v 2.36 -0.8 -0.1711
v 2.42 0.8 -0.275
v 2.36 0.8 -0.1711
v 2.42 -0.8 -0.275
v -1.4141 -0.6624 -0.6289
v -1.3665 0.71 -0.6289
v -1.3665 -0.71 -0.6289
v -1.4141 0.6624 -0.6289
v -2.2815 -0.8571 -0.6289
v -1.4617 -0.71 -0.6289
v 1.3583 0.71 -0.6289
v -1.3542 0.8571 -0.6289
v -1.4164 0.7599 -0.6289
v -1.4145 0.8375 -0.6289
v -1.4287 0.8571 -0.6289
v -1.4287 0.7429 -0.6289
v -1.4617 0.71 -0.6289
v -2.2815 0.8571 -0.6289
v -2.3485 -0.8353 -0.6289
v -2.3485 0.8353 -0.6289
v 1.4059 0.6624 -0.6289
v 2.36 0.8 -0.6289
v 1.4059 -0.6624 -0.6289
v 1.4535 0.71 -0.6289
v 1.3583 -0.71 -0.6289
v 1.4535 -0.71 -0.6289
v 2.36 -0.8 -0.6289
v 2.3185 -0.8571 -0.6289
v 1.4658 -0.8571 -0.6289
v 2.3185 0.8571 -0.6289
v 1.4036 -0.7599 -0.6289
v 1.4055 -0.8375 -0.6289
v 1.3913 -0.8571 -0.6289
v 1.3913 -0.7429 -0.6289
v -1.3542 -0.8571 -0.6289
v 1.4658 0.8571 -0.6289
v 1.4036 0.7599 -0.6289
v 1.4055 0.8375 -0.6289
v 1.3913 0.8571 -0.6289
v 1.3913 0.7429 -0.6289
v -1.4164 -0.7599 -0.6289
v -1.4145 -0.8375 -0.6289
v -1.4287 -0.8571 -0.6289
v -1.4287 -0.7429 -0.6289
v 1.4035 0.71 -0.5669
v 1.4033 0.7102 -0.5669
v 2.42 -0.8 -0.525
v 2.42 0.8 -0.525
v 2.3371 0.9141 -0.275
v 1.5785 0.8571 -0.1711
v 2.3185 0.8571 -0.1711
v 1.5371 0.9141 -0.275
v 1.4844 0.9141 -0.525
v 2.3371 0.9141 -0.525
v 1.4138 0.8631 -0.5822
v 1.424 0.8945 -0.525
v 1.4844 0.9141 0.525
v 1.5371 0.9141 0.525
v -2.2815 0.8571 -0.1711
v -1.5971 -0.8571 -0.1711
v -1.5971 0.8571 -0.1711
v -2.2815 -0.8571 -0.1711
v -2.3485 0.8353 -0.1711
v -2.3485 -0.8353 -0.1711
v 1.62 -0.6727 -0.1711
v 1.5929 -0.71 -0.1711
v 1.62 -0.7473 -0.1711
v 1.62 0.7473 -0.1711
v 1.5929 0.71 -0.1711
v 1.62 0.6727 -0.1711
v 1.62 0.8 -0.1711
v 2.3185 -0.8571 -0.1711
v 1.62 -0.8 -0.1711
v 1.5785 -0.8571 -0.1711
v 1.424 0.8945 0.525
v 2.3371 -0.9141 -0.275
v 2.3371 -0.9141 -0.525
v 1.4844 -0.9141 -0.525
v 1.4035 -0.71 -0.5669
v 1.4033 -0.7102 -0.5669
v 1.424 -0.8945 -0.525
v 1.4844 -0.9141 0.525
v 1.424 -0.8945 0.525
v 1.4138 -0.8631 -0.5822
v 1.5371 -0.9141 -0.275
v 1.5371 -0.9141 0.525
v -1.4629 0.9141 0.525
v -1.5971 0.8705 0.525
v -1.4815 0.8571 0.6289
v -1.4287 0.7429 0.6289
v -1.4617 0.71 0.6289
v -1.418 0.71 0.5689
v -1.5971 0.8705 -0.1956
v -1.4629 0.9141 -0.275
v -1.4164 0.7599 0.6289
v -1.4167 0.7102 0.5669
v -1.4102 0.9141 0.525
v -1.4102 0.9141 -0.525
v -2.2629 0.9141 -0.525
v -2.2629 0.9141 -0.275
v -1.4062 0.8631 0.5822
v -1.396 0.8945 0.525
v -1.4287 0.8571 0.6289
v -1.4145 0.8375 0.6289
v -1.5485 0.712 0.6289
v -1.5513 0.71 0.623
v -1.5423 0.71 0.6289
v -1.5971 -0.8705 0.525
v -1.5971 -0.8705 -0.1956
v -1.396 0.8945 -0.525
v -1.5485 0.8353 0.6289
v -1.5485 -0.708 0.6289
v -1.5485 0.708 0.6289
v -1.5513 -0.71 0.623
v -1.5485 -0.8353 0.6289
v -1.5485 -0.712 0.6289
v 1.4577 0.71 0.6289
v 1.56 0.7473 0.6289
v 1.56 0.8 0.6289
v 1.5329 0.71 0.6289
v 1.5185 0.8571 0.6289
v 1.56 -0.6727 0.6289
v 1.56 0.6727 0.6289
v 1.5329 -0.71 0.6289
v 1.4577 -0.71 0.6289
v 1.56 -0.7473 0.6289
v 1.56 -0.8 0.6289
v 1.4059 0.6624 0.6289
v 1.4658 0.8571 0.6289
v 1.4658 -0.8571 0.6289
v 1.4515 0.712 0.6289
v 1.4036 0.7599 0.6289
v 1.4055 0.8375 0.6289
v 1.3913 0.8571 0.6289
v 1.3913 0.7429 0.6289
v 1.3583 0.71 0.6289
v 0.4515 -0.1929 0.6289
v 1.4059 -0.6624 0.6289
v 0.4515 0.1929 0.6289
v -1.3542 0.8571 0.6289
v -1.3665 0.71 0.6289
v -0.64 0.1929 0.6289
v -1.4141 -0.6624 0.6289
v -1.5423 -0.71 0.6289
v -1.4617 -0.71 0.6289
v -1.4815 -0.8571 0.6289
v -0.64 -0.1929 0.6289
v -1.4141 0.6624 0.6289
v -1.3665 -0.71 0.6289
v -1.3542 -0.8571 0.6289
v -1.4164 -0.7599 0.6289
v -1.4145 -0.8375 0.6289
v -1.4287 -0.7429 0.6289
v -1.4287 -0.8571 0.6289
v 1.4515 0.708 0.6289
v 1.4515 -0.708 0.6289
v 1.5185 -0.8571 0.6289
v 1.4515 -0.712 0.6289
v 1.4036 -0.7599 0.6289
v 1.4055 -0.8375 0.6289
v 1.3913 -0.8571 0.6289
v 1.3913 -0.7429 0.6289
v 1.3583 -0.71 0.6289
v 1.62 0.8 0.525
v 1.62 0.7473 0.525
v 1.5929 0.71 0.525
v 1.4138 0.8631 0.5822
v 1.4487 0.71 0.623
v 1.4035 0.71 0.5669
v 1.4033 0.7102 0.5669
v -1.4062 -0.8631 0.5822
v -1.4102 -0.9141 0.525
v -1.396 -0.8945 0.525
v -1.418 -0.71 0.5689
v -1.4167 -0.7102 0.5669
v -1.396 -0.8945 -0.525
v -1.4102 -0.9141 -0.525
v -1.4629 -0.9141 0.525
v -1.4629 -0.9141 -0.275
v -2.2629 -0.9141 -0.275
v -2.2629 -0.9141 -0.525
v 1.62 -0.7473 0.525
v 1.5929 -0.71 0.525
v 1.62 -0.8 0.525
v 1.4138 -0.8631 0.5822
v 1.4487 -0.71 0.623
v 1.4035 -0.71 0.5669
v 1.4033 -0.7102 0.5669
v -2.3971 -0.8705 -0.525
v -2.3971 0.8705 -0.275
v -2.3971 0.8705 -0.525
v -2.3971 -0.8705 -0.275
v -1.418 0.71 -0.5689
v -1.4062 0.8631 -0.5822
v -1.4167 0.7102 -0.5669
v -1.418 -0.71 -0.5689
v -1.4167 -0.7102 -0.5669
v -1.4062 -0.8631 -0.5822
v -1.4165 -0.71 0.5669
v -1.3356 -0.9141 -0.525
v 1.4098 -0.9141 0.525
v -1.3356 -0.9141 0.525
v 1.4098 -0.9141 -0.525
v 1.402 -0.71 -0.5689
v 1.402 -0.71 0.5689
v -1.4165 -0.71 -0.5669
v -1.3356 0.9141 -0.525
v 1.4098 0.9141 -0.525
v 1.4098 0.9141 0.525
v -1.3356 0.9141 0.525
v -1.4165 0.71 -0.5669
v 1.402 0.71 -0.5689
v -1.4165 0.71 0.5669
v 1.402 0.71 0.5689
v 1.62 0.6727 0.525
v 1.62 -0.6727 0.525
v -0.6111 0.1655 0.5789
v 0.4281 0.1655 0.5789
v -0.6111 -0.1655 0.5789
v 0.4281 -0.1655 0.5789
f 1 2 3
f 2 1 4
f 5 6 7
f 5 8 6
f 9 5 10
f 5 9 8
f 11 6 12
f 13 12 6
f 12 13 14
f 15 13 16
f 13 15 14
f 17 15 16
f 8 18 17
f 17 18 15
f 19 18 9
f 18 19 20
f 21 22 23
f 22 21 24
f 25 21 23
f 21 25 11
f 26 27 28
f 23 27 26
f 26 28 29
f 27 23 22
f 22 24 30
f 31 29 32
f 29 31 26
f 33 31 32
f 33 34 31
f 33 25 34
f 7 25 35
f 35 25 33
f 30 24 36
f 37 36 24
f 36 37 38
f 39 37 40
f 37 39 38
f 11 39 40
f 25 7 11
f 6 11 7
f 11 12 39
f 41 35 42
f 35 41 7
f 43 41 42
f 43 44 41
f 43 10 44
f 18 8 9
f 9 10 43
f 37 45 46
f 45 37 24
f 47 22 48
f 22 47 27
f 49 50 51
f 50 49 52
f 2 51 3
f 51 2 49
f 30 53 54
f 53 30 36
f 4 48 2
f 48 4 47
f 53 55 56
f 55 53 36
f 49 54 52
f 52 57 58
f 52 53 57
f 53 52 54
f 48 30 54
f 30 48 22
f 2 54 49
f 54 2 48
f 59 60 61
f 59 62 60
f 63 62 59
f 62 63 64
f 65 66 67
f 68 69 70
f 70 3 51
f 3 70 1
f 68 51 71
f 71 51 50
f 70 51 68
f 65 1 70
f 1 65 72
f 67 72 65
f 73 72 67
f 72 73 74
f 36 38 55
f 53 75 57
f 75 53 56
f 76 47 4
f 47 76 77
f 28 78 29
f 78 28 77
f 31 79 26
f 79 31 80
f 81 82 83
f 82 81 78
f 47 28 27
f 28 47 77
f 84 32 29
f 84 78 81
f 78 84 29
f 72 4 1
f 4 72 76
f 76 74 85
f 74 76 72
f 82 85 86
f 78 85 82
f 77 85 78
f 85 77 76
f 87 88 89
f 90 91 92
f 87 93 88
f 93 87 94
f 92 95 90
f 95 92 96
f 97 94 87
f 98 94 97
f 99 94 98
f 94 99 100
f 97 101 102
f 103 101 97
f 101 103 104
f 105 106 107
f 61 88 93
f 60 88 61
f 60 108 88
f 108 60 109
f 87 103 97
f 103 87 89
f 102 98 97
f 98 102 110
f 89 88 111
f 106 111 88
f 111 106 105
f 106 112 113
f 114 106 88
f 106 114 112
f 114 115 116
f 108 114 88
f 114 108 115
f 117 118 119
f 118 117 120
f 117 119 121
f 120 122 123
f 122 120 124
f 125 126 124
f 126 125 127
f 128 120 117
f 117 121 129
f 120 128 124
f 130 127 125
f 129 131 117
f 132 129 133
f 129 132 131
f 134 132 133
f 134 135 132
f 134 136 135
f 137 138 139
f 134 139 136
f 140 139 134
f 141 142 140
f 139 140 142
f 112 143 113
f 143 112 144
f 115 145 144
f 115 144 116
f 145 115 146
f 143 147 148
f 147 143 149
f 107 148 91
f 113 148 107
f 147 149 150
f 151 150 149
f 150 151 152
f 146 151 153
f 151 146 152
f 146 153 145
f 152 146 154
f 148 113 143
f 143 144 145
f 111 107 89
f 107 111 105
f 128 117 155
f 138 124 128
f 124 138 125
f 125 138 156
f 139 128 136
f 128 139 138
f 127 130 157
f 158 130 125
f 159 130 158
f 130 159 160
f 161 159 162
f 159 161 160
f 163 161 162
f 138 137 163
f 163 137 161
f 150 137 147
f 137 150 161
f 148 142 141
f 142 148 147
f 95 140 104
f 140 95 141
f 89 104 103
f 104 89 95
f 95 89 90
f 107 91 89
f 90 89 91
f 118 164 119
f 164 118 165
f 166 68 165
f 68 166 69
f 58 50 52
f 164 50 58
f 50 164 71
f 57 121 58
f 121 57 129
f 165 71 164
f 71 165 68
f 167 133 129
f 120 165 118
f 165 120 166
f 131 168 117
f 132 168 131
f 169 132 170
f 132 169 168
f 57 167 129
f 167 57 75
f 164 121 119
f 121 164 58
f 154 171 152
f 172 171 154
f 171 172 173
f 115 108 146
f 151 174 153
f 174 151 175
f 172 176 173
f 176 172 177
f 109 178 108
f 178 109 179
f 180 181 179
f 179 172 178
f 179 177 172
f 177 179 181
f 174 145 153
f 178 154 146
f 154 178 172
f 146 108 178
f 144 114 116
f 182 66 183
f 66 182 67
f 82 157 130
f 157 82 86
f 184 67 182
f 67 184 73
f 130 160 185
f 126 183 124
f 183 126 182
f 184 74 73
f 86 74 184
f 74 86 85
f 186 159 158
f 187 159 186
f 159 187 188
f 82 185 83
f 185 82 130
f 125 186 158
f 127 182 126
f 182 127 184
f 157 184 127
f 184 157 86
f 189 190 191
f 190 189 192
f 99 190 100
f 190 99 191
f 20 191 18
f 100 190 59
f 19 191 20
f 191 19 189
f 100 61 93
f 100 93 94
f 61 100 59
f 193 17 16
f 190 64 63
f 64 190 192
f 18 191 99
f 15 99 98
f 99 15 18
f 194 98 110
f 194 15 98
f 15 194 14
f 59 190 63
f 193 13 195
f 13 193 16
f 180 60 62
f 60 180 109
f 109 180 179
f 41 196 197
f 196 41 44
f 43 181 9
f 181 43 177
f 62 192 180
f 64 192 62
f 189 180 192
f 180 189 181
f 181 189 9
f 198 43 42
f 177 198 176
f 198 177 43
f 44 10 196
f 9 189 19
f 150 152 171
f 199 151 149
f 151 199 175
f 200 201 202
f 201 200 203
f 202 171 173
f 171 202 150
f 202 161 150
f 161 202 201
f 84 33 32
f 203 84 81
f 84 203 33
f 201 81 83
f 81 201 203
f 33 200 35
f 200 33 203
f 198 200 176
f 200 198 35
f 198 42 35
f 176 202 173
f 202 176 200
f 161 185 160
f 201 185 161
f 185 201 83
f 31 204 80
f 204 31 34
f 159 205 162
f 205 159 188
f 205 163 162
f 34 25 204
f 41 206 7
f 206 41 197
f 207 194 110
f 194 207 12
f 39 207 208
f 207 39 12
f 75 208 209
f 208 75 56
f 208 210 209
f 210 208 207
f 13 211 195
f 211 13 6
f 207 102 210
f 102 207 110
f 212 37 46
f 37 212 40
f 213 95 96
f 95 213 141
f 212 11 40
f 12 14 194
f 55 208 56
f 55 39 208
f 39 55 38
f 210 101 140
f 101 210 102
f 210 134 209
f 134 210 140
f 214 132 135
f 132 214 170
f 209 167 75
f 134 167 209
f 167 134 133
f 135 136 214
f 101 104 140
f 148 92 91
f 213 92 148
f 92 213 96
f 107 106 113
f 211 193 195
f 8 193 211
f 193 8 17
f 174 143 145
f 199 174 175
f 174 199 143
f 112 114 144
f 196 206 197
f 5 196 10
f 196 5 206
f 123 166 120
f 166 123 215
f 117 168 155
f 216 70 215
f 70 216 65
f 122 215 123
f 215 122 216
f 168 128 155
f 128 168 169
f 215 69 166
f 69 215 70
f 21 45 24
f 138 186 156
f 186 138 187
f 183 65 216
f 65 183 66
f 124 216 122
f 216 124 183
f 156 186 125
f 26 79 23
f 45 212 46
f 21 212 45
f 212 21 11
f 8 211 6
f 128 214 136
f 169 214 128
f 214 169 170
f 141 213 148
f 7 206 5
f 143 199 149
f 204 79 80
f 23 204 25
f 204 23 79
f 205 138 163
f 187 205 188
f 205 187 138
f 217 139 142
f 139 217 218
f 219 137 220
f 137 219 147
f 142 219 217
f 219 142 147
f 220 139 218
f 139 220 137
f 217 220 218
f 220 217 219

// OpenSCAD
// Parameters
body_L = 3.0; //[1.5:6.0:0.05]
body_W = 1.6; //[0.8:3.2:0.05]
body_H = 1.05; //[0.5:2.1:0.05]
term_L = 0.35; //[0.15:0.8:0.01]
term_H = 0.25; //[0.1:0.6:0.01]
term_inset = 0.05; //[0.0:0.2:0.01]
overlap = 0.8; //[0.3:1.5:0.05]
edge_fillet_r = 0.12; //[0.05:0.3:0.01]
chamfer = 0.18; //[0.05:0.4:0.01]
mark_L = 1.2; //[0.5:2.4:0.05]
mark_W = 0.5; //[0.2:1.2:0.05]
mark_depth = 0.05; //[0.01:0.15:0.01]

// Base shapes
module chip_body() {
  cube([body_L, body_W, body_H], center=true);
}

module terminal_end_1() {
  translate([-body_L/2 + (term_L + term_inset + overlap)/2 - overlap, 0, -body_H/2 + term_H/2])
    cube([term_L + term_inset + overlap, body_W, term_H], center=true);
}

module terminal_end_2() {
  translate([body_L/2 - (term_L + term_inset + overlap)/2 + overlap, 0, -body_H/2 + term_H/2])
    cube([term_L + term_inset + overlap, body_W, term_H], center=true);
}

module top_marking() {
  translate([-body_L/2 + mark_L/2 + overlap, 0, body_H/2 - mark_depth/2])
    cube([mark_L, mark_W, mark_depth], center=true);
}

module edge_fillet_sphere() {
  sphere(r=edge_fillet_r, center=true);
}

module chamfer_wedge() {
  rotate([0, 0, 45])
    cube([chamfer, chamfer, body_H + 2*overlap], center=true);
}

// Operations
module chip_body_with_terminals() {
  union() {
    chip_body();
    terminal_end_1();
    terminal_end_2();
  }
}

module chamfered_corners() {
  union() {
    translate([body_L/2 - chamfer/2, body_W/2 - chamfer/2, 0]) chamfer_wedge();
    translate([body_L/2 - chamfer/2, -body_W/2 + chamfer/2, 0]) chamfer_wedge();
    translate([-body_L/2 + chamfer/2, body_W/2 - chamfer/2, 0]) chamfer_wedge();
    translate([-body_L/2 + chamfer/2, -body_W/2 + chamfer/2, 0]) chamfer_wedge();
  }
}

module chip_body_chamfered() {
  difference() {
    chip_body_with_terminals();
    chamfered_corners();
  }
}

module chip_body_marked() {
  difference() {
    chip_body_chamfered();
    top_marking();
  }
}

module edge_fillet() {
  minkowski() {
    chip_body_marked();
    edge_fillet_sphere();
  }
}

// Final output
edge_fillet();
